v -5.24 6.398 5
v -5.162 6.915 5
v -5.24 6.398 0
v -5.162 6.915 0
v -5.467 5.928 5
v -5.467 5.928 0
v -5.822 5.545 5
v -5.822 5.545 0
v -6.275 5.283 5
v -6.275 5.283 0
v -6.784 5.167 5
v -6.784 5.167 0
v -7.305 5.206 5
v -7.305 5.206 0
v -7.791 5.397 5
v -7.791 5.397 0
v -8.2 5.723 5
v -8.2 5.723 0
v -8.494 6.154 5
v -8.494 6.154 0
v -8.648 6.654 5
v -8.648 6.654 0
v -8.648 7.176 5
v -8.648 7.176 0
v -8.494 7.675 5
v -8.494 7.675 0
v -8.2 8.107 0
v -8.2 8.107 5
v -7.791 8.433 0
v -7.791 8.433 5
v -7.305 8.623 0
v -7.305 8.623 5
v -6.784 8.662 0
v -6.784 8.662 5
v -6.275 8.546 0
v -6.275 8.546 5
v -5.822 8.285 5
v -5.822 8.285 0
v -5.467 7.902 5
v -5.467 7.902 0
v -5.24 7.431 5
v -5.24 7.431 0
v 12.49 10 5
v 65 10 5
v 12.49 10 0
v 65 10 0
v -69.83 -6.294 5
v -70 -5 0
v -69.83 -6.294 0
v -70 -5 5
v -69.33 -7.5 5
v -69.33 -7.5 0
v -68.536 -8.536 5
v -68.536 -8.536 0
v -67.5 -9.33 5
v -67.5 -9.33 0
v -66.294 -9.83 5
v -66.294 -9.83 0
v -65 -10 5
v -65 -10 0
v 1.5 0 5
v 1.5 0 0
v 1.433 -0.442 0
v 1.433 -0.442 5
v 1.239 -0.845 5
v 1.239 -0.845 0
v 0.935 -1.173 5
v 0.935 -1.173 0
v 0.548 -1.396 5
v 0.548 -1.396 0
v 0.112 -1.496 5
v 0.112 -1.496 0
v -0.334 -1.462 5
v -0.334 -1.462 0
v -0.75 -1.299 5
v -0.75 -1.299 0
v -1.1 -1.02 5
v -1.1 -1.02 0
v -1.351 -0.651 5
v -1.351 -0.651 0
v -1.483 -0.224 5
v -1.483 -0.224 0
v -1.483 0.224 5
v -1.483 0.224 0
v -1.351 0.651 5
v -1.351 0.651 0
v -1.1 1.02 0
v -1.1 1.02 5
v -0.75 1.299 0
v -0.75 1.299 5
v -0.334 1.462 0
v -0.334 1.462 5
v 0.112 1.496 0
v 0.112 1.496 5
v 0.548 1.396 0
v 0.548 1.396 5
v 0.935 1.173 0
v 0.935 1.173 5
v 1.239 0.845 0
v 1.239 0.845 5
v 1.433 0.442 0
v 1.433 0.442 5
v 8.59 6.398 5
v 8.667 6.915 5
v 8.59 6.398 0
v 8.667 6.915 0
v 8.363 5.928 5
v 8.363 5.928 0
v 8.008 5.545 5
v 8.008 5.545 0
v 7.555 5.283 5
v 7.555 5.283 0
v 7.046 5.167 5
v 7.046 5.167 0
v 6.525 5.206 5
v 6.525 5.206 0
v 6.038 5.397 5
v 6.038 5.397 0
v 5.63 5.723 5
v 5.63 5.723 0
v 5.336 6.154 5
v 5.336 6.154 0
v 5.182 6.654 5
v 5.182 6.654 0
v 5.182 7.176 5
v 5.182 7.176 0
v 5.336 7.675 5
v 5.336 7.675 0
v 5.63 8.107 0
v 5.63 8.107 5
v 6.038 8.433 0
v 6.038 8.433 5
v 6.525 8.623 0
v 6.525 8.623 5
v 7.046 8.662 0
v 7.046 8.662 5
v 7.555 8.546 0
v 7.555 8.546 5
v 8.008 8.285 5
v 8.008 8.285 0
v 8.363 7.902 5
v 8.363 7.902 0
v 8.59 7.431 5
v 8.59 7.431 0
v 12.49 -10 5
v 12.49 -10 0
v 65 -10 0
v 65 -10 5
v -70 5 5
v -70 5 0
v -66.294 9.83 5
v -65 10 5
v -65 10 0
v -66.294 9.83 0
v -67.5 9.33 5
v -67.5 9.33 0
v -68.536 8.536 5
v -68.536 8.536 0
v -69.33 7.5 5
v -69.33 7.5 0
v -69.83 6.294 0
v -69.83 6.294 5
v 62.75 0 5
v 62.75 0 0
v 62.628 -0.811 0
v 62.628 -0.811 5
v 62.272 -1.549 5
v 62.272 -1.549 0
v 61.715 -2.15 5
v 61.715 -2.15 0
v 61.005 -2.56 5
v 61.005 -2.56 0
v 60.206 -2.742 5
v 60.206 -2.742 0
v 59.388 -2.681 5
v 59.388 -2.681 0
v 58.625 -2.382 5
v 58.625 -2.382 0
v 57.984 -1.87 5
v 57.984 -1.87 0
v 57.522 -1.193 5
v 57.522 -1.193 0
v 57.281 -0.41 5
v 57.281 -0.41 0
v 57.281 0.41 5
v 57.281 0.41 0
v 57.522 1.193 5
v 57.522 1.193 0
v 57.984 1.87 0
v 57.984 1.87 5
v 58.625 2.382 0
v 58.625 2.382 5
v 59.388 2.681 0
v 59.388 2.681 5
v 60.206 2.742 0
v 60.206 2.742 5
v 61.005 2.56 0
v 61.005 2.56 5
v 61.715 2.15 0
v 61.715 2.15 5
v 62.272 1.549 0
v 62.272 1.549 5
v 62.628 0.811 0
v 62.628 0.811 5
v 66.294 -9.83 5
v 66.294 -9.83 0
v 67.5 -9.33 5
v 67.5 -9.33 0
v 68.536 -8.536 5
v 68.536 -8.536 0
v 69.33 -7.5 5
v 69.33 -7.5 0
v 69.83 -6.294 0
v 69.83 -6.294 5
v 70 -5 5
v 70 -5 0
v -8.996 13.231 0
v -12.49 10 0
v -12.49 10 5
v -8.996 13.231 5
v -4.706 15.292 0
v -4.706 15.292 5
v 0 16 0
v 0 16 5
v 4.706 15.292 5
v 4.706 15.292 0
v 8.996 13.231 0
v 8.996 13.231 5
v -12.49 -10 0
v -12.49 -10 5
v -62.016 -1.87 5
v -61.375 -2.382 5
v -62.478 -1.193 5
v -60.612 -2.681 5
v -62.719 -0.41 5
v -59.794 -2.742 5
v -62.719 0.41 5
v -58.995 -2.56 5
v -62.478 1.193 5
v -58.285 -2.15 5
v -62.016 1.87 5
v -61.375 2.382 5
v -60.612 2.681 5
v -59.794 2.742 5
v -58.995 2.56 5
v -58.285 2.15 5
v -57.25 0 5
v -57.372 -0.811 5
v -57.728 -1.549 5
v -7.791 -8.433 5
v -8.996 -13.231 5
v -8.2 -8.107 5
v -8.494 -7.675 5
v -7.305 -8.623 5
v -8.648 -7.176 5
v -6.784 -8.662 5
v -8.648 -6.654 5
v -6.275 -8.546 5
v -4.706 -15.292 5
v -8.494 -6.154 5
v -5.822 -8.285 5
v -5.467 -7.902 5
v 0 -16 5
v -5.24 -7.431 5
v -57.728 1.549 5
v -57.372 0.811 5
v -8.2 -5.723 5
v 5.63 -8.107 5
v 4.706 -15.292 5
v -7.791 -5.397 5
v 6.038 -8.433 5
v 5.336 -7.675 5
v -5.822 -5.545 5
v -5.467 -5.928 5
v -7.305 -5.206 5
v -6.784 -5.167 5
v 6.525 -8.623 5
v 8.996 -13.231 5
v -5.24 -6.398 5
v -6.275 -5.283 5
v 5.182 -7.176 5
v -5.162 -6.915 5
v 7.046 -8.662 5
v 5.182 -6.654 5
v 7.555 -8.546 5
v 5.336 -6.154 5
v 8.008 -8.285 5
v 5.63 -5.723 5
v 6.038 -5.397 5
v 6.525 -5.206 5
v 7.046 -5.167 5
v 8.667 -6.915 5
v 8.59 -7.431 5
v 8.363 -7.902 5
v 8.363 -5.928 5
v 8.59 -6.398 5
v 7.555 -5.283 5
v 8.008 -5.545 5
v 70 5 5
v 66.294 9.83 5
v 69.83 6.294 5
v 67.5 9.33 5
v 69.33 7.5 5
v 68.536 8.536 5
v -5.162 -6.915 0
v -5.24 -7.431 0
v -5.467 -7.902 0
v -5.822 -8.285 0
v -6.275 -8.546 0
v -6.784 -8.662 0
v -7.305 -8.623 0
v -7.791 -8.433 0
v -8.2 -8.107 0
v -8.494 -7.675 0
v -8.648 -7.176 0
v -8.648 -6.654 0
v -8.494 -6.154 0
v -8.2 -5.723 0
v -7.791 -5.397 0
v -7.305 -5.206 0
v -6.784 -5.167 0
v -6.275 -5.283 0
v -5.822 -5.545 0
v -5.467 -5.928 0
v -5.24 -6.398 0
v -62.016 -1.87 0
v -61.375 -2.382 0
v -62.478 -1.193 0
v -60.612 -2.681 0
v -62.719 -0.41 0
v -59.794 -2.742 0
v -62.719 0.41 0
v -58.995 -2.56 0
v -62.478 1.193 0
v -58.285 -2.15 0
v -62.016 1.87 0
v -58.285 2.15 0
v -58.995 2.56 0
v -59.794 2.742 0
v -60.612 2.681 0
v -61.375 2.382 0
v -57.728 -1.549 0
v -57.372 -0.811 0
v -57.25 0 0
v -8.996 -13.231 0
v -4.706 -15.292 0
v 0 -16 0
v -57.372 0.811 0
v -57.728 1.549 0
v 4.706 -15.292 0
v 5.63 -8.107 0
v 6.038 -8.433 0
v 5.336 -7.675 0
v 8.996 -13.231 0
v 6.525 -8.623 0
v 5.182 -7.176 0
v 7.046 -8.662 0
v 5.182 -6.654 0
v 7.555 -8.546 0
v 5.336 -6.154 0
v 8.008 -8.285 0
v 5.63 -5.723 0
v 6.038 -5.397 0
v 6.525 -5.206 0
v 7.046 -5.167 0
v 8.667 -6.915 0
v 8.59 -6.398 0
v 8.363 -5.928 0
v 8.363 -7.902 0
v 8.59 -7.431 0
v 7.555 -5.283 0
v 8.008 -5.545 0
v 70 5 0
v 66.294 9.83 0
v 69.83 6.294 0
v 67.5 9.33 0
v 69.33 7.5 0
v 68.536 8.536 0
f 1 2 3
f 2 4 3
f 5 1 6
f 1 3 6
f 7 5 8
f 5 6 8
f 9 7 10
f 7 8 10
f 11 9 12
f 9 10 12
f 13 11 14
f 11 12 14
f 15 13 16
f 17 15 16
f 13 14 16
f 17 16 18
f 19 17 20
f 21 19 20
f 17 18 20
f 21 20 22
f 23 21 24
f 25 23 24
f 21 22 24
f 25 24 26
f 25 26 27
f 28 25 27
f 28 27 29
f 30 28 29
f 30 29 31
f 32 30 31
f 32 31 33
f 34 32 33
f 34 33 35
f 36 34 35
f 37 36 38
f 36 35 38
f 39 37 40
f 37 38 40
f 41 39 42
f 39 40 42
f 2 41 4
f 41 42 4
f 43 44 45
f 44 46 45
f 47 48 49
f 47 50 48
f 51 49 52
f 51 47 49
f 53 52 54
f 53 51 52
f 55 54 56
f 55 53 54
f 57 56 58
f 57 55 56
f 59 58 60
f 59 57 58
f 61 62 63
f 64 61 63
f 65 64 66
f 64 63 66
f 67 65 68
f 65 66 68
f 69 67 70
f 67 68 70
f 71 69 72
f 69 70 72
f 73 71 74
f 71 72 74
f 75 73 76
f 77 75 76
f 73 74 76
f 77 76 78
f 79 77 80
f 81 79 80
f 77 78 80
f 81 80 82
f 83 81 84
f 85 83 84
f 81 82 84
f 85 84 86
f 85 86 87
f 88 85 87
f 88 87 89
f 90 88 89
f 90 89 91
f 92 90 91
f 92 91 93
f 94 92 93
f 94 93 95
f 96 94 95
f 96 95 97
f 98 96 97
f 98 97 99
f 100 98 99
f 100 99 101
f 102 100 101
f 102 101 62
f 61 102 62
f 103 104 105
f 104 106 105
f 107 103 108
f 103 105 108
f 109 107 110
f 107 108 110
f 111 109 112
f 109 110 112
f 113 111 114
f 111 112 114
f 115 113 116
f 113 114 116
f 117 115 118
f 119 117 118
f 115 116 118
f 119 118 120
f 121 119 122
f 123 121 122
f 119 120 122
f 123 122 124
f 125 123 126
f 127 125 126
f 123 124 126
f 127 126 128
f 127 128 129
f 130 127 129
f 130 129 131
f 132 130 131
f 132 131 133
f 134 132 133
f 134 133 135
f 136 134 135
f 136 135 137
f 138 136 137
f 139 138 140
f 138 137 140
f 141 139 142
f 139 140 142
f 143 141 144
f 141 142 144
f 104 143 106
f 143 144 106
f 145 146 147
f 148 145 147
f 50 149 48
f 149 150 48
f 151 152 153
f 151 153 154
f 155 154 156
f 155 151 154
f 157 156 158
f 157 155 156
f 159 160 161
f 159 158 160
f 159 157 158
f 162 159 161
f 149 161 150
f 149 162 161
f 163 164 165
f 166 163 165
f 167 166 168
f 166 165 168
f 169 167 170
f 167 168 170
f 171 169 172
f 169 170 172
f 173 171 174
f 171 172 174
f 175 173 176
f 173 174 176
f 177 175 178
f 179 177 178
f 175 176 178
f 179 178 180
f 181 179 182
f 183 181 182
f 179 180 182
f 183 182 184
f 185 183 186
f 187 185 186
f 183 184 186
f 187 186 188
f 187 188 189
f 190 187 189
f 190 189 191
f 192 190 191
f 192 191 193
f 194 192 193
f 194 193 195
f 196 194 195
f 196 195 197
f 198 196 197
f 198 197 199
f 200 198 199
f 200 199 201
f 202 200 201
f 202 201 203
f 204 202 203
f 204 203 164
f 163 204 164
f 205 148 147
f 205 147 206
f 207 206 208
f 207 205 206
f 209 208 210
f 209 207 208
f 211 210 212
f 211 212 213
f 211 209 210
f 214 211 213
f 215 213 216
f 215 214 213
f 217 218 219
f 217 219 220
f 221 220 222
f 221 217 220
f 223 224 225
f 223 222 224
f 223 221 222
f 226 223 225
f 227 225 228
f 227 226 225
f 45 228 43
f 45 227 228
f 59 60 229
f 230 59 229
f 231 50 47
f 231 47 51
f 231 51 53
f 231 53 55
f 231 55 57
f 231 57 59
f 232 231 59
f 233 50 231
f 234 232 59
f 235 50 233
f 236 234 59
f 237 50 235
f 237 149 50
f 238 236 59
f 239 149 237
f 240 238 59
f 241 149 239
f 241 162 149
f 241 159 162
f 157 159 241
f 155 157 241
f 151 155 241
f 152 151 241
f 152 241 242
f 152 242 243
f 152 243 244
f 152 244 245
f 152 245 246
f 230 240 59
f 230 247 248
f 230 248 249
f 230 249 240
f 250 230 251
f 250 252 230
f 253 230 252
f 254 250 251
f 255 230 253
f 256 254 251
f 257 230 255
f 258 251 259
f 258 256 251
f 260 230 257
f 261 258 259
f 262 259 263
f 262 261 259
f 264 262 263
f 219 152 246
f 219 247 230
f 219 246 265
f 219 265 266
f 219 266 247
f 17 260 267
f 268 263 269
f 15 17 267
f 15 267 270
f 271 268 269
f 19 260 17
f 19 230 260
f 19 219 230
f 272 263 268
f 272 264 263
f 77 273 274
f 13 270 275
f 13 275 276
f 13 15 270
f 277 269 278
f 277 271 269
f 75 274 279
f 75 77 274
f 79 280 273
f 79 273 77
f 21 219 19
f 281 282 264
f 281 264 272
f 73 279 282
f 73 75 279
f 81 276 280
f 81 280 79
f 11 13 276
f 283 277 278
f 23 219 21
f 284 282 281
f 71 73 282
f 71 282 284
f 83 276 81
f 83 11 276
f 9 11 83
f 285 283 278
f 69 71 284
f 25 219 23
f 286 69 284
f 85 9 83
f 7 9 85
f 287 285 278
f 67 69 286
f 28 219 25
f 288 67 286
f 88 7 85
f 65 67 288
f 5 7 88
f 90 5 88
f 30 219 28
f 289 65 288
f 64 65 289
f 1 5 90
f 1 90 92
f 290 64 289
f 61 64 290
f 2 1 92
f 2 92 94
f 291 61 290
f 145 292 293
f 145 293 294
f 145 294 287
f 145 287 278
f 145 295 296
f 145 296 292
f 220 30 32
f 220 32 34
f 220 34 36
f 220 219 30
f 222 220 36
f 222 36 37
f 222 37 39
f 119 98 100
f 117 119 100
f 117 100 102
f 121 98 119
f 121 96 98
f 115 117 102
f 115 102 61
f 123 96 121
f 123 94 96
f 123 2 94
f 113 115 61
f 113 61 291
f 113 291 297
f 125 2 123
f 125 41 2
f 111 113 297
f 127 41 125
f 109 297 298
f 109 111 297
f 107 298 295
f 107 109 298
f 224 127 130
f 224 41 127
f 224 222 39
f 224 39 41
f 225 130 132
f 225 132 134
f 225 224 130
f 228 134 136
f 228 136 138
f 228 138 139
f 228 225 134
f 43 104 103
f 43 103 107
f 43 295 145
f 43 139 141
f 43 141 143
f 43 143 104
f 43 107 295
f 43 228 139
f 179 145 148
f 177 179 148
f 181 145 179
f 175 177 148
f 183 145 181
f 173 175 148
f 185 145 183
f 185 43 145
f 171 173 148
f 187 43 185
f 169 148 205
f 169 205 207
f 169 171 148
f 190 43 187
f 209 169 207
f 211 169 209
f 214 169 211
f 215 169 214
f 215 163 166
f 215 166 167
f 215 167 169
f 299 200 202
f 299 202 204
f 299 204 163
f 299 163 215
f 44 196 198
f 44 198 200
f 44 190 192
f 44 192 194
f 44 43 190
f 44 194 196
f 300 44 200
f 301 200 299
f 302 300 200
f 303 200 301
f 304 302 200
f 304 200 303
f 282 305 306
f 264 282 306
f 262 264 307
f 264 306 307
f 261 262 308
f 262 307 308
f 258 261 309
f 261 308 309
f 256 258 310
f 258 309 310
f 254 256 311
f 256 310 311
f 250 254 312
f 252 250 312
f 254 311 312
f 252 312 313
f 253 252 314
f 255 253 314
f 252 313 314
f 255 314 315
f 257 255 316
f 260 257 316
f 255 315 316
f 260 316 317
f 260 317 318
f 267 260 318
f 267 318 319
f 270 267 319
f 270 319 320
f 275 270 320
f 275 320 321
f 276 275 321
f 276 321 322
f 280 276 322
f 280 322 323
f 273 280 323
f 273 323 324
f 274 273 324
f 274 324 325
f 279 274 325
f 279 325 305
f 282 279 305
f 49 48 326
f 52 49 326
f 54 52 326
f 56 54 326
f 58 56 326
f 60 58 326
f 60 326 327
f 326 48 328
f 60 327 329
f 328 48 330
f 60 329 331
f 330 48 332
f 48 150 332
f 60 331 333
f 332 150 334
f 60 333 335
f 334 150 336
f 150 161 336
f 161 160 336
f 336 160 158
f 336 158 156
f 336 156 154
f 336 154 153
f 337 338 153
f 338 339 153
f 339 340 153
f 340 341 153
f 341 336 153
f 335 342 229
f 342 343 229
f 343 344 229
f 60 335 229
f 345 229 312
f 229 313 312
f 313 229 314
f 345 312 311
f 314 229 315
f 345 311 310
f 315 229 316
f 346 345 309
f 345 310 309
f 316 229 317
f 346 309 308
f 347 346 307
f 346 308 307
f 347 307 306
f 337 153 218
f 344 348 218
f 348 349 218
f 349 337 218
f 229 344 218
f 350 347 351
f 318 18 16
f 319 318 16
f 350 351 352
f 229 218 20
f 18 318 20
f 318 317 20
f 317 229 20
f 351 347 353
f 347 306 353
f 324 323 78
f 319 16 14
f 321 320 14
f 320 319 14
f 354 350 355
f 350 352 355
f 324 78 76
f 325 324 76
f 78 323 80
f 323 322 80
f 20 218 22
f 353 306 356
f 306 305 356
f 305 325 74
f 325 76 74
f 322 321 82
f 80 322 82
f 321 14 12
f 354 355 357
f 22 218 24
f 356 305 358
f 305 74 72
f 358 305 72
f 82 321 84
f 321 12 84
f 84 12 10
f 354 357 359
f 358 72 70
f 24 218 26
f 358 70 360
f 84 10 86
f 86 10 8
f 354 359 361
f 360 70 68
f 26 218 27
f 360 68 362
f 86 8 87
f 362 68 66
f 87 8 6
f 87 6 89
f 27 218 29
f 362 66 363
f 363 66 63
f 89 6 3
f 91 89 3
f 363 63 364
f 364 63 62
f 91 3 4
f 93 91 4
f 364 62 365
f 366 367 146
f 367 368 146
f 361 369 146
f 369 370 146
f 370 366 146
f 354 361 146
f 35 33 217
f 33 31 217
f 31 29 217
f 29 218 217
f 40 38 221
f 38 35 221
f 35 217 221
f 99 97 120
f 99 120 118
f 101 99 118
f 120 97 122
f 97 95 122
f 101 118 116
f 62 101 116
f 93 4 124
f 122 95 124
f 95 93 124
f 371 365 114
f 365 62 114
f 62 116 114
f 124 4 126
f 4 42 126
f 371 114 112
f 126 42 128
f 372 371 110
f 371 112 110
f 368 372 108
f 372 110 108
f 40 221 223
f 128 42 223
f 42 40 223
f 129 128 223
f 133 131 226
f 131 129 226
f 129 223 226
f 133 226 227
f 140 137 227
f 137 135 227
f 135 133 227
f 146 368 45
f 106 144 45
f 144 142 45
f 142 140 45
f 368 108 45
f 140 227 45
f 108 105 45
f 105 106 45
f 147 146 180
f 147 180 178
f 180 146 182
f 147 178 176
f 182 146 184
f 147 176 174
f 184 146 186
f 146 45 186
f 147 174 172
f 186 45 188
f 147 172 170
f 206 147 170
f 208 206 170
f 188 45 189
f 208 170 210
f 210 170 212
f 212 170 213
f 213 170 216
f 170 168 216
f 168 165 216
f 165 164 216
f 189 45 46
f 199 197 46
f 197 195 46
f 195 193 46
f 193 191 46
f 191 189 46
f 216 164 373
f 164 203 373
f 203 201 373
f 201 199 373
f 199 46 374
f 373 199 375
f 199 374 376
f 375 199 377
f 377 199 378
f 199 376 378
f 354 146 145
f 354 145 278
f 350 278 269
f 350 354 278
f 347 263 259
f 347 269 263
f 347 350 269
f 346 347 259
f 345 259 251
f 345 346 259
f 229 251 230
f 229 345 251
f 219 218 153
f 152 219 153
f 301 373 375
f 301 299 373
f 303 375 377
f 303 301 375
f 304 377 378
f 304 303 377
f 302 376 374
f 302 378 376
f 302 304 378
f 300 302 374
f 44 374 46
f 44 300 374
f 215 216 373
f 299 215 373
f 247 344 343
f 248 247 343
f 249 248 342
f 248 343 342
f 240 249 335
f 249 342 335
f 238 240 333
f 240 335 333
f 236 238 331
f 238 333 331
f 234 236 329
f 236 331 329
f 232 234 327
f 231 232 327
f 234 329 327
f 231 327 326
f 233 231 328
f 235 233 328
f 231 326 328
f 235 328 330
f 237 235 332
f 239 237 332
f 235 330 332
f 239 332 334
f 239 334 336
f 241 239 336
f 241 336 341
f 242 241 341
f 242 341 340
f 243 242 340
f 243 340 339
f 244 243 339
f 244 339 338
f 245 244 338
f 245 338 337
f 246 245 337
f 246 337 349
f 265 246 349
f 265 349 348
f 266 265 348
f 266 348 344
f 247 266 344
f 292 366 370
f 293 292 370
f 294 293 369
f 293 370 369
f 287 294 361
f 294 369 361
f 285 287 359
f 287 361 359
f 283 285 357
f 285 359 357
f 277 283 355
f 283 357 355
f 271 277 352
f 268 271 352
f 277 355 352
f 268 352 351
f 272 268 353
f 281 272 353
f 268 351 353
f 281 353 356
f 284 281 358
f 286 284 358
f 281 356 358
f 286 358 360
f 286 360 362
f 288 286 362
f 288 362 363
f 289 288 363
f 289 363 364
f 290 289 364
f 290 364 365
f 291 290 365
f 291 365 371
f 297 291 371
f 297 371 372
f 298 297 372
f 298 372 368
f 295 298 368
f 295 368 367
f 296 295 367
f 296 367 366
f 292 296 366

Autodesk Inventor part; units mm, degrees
ref_plane "YZ Plane" through (0, 0, 0) normal (1, 0, 0) x (0, 1, 0)
ref_plane "XZ Plane" through (0, 0, 0) normal (0, 1, 0) x (-1, 0, 0)
ref_plane "XY Plane" through (0, 0, 0) normal (0, 0, 1) x (1, 0, 0)
sketch "Sketch1" plane through (0, 0, 0) normal (0, 0, 1) x (1, 0, 0)
  line L0 (-70, -10) -> (70, -10)
  line L1 (70, -10) -> (70, 10)
  line L2 (70, 10) -> (-70, 10)
  line L3 (-70, 10) -> (-70, -10)
  line L4 (-70, -10) -> (70, 10) construction
  line L5 (70, -10) -> (-70, 10) construction
  circle A0 centre (0, 0) radius 16
  line L6 (-73.4722, 0) -> (96.5278, 0) construction
  circle A1 centre (-60, 0) radius 2.75
  line L7 (0, 0) -> (0, 31) construction
  circle A2 centre (60, 0) radius 2.75
  circle A3 centre (0, 0) radius 1.5
  circle A4 centre (-6.9148, 6.9148) radius 1.7526
  line L8 (0, 0) -> (-14.5685, 14.5685) construction
  circle A5 centre (-6.9148, -6.9148) radius 1.7526
  circle A6 centre (6.9148, -6.9148) radius 1.7526
  circle A7 centre (6.9148, 6.9148) radius 1.7526
  point P0 (0, 0)
  dimension "d0" = 140
  dimension "d1" = 20
  dimension "d4" = 32
  dimension "d5" = 5.5
  dimension "d6" = 10
  dimension "d10" = 3
  dimension "d11" = 3.5052
  dimension "d12" = 45
  dimension "d13" = 6.9148
  dimension "d16" = 360
extrude "Extrusion1" add sketch "Sketch1" along normal blind 5 contours L3 L2 A0 L0 | A0 L2 L0 | L0 A0 | A0 L2 L1 L0 | A0 L2 | A1 | A2 | A3 | A4 | A5 | A6 | A7
extrude "Extrusion2" cut sketch "Sketch1" along normal through all contours A1 | A2 | A3 | A4 | A5 | A6 | A7
fillet "Fillet1" radius 5 4 edges at (70, -10, 2.5) (70, 10, 2.5) (-70, -10, 2.5) (-70, 10, 2.5)
equation "\"BendRadius\" = Thickness"
equation "\"BendReliefWidth\" = Thickness"
equation "\"BendReliefDepth\" = 0.5 * Thickness"
equation "\"CornerReliefSize\" = 4 * Thickness"
equation "\"MinimumRemnant\" = 2 * Thickness"
equation "\"TransitionRadius\" = BendRadius"
equation "\"JacobiRadiusSize\" = Thickness"
equation "\"GapSize\" = Thickness"
equation "\"Thickness\" = 0.5"
properties part number "rudder_horn"
